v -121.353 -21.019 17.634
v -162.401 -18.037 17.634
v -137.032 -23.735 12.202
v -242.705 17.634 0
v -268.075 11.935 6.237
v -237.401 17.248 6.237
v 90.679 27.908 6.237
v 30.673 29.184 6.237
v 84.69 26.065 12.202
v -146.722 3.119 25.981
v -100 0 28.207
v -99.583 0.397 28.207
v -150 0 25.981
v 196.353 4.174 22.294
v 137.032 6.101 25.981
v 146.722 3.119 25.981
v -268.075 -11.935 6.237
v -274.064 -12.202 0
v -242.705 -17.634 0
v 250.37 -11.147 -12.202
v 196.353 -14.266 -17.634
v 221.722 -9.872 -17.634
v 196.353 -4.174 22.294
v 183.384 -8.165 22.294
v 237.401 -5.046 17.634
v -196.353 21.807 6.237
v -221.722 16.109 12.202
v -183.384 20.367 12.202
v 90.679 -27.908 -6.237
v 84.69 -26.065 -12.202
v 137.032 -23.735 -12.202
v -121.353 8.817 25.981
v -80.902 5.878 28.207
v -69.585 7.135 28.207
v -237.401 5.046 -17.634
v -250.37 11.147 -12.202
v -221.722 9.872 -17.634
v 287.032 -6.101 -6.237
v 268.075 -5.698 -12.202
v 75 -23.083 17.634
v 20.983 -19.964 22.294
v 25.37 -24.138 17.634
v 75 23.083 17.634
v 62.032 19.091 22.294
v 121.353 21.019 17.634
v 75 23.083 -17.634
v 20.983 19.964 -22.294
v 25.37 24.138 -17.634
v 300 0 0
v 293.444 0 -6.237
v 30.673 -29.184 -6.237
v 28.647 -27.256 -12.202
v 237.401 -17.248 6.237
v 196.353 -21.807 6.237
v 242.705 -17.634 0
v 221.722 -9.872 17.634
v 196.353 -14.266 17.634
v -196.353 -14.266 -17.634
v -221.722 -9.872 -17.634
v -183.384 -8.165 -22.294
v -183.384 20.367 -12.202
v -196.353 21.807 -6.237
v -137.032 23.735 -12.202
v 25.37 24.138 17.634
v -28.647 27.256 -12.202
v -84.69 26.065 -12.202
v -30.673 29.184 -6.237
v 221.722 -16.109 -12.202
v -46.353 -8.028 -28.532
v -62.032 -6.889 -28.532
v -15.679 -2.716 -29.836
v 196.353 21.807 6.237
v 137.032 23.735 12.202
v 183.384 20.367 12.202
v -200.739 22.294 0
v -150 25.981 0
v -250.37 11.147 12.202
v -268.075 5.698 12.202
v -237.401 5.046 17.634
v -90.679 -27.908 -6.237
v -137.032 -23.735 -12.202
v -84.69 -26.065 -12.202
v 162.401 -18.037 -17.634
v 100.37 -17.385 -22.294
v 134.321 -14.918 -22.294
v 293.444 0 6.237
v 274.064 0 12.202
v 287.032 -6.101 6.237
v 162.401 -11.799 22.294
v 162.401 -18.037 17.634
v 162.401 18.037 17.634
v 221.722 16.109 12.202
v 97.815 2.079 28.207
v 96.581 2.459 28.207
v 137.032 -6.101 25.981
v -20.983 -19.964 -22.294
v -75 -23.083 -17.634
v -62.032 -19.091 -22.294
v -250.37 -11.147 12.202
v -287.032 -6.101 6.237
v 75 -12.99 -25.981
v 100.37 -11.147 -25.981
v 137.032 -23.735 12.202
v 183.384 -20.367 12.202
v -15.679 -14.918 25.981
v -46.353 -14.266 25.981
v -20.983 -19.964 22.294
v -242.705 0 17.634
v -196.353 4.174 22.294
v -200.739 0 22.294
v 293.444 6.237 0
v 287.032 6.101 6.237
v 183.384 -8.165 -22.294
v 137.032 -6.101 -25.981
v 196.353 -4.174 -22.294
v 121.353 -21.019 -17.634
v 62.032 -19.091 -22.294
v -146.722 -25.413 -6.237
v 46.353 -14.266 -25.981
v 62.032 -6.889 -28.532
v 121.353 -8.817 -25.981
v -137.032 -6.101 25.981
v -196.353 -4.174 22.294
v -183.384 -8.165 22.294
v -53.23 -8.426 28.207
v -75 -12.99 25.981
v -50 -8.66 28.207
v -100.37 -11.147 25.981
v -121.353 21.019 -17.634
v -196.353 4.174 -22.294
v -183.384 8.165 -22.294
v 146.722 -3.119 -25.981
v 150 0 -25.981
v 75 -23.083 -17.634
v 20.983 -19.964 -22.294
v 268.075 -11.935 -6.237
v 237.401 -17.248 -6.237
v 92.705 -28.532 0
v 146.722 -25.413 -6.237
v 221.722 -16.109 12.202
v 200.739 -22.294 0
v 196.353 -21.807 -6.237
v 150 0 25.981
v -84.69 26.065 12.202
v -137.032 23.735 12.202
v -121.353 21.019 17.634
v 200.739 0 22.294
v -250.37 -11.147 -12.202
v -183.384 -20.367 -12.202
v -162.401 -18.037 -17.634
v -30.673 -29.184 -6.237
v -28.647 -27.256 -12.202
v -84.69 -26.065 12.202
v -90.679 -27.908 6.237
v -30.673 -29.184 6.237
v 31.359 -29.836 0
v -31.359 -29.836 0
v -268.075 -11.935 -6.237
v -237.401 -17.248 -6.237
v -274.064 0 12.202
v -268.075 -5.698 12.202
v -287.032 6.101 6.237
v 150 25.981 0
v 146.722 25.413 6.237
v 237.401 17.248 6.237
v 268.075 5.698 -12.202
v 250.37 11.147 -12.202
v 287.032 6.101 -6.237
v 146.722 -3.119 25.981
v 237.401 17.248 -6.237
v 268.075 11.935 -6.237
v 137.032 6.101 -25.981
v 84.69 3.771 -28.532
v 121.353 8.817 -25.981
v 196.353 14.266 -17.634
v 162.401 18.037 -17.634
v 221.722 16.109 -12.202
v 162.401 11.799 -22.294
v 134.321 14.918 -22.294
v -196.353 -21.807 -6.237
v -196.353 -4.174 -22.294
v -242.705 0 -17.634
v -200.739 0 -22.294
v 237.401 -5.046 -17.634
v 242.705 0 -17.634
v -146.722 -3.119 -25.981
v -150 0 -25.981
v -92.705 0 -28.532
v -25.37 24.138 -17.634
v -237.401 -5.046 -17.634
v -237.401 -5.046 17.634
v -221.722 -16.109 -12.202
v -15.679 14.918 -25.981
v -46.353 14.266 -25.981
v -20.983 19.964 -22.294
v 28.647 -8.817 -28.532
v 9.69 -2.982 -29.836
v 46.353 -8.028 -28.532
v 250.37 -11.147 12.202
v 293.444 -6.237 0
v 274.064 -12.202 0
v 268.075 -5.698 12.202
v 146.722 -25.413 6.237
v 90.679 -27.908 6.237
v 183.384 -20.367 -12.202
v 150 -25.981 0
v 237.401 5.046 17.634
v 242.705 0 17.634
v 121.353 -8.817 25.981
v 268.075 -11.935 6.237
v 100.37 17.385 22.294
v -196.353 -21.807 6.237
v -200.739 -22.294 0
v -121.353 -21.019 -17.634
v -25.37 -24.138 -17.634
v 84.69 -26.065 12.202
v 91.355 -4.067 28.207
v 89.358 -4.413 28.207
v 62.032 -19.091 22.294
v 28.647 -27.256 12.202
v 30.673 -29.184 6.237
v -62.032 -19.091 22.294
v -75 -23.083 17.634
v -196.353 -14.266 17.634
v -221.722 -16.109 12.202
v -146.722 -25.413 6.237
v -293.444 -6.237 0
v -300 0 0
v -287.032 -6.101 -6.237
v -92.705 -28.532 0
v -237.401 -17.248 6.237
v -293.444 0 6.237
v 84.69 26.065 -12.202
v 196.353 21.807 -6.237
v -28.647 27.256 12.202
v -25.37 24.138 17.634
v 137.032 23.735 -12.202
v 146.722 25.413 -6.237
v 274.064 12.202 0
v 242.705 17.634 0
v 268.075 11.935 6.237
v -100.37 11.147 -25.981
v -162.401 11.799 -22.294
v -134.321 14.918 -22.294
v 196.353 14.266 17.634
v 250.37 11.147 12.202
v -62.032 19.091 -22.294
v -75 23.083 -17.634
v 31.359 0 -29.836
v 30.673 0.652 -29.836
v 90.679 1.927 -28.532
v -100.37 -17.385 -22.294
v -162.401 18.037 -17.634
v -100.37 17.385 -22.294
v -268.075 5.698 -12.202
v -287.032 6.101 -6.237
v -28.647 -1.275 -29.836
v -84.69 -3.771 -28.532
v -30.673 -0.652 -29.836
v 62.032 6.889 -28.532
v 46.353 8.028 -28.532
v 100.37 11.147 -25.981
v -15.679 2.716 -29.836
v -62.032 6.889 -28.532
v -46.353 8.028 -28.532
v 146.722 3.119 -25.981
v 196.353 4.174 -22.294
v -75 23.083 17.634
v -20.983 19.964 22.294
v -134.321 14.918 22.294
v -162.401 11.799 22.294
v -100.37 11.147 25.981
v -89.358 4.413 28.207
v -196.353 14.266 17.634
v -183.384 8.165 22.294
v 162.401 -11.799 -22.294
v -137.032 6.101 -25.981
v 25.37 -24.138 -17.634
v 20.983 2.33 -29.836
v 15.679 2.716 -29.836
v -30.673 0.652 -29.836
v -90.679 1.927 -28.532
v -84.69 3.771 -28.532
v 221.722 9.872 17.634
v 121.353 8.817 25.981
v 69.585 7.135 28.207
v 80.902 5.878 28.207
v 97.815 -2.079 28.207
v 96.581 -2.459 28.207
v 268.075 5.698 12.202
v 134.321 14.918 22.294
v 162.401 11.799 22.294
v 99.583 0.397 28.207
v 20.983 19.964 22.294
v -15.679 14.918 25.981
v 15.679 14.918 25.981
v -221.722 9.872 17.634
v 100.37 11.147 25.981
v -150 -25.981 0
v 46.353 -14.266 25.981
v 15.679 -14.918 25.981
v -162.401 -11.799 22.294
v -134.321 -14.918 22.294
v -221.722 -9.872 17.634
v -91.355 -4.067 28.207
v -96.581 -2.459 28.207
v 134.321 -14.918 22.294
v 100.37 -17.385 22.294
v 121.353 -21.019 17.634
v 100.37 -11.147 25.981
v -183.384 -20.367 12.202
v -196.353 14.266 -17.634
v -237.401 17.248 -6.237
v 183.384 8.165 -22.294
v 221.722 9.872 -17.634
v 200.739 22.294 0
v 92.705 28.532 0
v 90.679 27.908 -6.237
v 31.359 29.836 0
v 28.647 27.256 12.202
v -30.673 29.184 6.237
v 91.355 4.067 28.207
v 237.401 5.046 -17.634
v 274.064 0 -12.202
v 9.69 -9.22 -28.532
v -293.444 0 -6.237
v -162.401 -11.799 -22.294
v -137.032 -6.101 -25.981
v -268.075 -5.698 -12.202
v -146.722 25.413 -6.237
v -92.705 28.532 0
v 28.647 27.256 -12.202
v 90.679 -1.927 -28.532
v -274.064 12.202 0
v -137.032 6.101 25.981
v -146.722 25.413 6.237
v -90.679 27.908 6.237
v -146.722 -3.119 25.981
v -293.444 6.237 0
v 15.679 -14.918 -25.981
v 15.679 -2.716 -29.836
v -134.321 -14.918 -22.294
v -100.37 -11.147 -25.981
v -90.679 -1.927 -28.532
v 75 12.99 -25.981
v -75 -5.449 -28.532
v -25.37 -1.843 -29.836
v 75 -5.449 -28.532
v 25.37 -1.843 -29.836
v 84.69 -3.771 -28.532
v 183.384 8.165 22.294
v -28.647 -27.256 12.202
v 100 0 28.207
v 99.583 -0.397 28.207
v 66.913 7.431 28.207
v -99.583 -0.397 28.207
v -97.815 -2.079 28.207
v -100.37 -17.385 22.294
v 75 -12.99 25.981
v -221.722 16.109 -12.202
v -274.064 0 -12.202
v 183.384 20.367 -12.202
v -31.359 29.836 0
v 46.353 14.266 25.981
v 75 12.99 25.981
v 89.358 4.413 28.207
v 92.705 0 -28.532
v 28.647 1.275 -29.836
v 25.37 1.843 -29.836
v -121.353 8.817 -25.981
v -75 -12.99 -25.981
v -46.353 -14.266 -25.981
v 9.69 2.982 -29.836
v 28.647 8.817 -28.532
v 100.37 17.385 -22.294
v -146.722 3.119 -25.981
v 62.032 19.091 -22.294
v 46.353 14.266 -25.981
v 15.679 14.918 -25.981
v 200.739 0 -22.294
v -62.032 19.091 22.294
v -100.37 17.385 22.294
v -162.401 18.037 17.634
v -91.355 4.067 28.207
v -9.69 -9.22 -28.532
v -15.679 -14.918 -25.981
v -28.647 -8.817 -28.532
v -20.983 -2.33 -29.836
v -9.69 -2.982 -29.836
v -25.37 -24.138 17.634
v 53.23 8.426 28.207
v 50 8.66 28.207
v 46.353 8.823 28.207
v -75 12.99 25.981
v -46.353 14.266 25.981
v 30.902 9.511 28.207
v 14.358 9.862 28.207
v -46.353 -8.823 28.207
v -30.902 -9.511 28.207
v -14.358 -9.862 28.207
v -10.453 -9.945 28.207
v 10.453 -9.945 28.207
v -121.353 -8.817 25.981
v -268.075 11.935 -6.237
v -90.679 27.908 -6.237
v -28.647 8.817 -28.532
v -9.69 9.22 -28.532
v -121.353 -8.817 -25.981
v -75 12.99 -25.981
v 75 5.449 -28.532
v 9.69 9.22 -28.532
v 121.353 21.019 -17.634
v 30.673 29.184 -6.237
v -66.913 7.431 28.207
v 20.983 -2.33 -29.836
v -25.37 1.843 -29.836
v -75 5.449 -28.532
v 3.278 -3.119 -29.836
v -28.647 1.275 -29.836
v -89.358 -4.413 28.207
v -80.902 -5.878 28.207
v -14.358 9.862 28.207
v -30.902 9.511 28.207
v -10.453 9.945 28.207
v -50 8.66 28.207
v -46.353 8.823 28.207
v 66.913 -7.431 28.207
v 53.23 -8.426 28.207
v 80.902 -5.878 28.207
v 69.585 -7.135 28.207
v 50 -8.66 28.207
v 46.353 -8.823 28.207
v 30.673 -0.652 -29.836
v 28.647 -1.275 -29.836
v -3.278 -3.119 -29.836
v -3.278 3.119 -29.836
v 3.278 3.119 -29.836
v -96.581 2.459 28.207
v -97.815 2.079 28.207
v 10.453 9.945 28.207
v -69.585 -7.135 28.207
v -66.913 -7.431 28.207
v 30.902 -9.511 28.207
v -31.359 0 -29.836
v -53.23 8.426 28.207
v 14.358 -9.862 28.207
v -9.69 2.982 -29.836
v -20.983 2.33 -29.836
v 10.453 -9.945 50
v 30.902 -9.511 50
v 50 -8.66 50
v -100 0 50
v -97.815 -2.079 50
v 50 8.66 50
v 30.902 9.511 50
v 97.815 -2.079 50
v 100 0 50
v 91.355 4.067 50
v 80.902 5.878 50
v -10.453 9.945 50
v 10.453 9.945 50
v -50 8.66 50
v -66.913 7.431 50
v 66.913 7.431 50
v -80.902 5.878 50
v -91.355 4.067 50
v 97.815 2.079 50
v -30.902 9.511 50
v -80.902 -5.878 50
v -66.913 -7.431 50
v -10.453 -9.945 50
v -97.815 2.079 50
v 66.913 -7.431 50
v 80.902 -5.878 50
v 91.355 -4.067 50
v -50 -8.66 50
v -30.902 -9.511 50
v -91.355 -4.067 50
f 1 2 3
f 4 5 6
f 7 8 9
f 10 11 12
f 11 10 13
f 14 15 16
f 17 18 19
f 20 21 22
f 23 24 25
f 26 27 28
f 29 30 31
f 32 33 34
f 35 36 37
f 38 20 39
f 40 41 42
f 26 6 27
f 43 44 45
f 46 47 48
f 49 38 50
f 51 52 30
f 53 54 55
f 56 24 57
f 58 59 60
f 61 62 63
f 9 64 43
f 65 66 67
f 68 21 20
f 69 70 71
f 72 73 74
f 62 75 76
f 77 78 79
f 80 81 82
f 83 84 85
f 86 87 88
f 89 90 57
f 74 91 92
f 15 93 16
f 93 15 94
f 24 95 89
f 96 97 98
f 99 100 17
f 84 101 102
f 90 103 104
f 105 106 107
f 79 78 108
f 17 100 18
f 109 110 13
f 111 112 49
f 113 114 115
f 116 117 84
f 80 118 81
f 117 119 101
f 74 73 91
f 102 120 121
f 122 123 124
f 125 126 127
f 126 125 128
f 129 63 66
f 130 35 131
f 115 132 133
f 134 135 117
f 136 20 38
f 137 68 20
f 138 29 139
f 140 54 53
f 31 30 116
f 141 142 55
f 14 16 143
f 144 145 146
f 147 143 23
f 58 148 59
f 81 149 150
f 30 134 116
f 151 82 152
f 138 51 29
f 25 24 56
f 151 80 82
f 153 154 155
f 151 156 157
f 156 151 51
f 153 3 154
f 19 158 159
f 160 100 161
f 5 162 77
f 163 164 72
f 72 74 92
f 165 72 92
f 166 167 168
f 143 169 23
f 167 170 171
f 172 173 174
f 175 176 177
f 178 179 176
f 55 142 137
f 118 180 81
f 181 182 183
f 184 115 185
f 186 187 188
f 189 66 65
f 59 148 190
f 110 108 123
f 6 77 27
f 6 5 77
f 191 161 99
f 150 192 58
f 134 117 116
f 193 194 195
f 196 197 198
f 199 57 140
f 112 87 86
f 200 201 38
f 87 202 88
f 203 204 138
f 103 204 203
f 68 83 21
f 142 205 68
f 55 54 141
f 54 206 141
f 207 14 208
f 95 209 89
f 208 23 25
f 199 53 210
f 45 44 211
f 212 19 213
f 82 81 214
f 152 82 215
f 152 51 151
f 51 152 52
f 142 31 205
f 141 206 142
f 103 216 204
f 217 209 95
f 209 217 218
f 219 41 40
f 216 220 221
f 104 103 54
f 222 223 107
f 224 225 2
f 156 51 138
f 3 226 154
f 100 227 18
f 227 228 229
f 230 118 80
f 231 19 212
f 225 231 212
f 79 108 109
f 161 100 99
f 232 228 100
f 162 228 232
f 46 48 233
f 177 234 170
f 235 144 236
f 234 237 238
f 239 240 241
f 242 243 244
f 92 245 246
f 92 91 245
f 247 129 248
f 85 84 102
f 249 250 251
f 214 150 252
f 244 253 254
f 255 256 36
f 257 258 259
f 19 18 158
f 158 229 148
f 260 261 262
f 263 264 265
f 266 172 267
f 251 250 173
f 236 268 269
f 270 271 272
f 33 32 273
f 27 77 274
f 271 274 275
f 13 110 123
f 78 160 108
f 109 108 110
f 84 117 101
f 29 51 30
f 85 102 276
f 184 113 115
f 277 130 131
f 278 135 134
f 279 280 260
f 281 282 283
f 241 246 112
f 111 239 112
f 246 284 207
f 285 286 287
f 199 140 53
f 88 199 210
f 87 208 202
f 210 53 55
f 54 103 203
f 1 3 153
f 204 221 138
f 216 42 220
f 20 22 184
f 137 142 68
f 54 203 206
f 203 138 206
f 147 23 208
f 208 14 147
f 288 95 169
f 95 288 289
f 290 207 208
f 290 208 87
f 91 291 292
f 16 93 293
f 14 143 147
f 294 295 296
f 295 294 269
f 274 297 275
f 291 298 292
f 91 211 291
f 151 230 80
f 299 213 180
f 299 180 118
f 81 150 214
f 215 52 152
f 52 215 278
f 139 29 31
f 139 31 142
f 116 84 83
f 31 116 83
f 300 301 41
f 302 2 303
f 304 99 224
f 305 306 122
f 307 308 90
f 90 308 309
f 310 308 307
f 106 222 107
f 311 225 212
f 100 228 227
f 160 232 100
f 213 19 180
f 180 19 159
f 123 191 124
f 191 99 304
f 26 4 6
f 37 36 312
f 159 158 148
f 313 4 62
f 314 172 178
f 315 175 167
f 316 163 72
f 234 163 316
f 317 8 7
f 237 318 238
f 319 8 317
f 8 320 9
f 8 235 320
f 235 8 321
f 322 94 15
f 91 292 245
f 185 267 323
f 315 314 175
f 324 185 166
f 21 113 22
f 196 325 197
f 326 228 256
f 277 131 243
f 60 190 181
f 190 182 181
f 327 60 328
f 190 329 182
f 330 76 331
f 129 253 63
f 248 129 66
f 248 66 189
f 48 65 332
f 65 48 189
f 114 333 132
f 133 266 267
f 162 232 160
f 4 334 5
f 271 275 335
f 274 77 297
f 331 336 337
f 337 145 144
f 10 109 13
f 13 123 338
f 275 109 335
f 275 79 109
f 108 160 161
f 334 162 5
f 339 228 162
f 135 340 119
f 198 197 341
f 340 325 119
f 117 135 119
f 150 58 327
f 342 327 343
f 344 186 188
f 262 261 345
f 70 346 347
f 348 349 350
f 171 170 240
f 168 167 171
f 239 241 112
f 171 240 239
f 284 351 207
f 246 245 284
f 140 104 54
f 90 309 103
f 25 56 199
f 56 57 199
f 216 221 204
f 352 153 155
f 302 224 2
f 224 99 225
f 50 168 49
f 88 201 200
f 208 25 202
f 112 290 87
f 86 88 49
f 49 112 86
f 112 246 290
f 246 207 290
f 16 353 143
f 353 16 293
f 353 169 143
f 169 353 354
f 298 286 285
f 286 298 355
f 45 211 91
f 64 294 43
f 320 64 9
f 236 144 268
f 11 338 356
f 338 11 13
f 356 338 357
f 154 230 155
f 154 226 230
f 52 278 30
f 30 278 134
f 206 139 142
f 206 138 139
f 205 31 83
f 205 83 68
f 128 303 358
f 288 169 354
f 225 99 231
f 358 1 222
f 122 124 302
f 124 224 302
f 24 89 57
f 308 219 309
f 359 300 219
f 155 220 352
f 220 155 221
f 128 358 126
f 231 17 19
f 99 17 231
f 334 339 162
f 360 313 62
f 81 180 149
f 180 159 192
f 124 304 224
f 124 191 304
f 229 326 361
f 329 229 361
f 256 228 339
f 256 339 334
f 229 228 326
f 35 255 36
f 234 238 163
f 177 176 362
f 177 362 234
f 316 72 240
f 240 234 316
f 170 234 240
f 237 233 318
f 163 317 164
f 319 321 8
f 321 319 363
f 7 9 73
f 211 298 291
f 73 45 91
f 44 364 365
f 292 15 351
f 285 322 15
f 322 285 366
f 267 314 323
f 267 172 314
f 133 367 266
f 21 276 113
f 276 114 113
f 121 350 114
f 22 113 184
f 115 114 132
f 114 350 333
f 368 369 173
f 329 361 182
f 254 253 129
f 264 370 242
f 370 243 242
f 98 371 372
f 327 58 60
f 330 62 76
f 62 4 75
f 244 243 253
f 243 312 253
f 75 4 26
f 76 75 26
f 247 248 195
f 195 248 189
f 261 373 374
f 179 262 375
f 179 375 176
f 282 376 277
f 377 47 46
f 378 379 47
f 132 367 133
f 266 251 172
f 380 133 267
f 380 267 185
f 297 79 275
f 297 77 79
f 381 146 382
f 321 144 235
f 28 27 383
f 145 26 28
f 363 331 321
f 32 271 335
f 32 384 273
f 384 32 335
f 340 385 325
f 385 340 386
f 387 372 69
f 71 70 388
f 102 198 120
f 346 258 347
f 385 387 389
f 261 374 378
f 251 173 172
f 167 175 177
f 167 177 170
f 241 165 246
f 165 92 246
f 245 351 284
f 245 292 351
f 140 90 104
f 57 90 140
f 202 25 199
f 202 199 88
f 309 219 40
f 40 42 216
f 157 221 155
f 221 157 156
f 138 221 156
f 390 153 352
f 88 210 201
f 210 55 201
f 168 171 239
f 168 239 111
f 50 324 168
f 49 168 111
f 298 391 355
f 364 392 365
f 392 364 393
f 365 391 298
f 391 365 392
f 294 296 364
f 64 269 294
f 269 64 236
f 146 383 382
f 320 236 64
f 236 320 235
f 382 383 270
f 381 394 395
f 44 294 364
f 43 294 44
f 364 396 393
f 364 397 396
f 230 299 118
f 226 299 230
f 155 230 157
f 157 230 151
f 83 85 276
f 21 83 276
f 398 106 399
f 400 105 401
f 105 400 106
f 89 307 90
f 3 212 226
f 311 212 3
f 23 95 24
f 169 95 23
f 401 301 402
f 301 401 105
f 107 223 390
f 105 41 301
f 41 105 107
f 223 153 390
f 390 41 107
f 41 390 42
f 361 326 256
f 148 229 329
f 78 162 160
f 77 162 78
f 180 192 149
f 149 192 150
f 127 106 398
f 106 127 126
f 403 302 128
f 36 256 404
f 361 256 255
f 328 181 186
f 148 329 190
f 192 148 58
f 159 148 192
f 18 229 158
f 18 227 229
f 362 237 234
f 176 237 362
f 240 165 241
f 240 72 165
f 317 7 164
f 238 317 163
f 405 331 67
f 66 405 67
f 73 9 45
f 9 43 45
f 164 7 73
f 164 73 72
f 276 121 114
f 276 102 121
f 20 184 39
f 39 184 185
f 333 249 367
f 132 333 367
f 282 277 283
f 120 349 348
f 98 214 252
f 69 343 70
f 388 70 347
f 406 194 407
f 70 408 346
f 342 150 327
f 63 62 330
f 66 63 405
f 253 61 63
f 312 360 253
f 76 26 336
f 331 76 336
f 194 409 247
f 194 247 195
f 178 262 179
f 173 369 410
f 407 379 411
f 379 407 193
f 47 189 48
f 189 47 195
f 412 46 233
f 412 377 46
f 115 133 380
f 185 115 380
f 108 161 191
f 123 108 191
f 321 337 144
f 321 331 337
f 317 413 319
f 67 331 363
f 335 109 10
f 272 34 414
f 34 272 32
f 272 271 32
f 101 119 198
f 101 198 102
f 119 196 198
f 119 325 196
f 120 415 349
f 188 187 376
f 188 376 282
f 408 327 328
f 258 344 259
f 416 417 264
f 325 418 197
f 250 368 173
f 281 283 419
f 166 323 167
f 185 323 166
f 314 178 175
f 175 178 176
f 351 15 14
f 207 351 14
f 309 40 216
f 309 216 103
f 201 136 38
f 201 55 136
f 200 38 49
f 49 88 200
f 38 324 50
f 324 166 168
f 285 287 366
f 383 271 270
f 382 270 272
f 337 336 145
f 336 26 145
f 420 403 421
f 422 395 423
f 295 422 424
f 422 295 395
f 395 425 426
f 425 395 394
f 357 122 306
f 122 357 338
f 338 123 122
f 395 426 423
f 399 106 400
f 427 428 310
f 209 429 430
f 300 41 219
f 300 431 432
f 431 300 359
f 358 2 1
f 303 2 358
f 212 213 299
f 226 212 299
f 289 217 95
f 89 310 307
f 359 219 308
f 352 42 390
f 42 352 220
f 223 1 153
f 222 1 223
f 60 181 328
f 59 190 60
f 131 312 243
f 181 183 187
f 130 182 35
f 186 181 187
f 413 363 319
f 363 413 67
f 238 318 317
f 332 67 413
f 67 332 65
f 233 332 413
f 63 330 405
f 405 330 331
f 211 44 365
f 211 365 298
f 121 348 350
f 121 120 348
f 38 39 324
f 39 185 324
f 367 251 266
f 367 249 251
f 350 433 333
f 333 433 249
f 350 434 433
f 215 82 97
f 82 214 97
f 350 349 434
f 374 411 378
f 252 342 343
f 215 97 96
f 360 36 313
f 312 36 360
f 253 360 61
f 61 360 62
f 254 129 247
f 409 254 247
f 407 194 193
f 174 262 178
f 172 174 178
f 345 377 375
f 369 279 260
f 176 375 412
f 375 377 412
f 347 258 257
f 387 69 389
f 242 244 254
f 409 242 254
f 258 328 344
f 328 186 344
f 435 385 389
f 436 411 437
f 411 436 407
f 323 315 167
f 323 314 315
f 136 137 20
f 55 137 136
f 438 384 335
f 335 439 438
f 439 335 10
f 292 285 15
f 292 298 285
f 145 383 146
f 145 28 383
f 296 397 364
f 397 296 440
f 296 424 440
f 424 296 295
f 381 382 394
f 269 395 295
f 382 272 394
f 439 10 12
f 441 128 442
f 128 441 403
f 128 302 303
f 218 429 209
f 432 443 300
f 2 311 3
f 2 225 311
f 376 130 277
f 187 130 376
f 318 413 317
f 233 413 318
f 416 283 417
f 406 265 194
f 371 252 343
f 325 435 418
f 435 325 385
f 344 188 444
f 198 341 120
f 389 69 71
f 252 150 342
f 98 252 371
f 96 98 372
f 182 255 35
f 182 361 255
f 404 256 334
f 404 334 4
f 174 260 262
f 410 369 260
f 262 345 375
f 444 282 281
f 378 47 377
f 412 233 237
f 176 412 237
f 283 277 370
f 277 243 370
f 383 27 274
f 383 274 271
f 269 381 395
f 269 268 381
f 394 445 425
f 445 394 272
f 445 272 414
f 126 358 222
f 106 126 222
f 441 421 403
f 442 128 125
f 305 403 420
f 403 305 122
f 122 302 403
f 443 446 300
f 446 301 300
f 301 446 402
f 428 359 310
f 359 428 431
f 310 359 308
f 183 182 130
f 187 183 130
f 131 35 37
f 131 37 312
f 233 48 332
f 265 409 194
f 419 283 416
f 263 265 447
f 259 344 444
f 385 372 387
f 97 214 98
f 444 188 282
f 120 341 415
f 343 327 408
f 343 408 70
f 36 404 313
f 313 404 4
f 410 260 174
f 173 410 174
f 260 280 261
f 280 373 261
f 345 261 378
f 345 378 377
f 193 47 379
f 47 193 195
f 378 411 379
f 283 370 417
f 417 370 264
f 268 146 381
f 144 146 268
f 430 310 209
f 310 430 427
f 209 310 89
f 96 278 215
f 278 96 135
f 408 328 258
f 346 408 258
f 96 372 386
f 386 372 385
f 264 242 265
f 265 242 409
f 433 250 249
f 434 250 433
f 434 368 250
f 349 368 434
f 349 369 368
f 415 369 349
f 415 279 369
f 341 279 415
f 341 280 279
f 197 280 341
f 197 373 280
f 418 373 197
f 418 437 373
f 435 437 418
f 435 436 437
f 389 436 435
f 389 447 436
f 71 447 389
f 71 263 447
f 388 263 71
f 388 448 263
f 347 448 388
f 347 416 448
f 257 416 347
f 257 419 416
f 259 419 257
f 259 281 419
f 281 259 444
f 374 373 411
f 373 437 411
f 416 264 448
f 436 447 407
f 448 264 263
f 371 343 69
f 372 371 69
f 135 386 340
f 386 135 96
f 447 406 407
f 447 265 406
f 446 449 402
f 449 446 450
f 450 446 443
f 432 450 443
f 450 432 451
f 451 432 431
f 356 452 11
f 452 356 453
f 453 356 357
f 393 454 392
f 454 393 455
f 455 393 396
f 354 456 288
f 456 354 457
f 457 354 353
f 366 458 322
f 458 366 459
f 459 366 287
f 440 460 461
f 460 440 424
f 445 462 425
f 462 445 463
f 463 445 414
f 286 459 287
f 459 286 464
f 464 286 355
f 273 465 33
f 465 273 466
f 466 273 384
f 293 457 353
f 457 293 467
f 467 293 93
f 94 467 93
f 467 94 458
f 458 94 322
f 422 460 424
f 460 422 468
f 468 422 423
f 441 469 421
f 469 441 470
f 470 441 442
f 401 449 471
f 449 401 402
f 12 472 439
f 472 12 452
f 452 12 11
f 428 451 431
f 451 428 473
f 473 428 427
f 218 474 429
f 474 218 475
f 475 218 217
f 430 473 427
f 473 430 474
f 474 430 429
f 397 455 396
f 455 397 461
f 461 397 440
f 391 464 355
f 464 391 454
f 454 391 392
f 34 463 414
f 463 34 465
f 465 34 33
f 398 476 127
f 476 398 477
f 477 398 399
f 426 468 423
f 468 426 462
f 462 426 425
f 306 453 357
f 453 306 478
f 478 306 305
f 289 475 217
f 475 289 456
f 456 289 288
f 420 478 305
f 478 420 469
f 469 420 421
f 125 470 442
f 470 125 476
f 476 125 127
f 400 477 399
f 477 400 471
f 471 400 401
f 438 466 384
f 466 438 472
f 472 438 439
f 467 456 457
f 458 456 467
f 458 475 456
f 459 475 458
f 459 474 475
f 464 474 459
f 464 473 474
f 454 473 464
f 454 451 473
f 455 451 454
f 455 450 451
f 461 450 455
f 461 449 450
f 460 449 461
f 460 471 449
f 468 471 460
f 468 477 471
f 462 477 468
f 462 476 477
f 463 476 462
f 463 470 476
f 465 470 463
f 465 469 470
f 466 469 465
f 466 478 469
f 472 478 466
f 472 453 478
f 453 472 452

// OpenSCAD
module elongate() {
  for (i = [0 : $children-1])
    scale([10 , 1, 1 ]) child(i);
}

elongate() { sphere(30); cube([10,10,10]); cylinder(r=10,h=50); }
